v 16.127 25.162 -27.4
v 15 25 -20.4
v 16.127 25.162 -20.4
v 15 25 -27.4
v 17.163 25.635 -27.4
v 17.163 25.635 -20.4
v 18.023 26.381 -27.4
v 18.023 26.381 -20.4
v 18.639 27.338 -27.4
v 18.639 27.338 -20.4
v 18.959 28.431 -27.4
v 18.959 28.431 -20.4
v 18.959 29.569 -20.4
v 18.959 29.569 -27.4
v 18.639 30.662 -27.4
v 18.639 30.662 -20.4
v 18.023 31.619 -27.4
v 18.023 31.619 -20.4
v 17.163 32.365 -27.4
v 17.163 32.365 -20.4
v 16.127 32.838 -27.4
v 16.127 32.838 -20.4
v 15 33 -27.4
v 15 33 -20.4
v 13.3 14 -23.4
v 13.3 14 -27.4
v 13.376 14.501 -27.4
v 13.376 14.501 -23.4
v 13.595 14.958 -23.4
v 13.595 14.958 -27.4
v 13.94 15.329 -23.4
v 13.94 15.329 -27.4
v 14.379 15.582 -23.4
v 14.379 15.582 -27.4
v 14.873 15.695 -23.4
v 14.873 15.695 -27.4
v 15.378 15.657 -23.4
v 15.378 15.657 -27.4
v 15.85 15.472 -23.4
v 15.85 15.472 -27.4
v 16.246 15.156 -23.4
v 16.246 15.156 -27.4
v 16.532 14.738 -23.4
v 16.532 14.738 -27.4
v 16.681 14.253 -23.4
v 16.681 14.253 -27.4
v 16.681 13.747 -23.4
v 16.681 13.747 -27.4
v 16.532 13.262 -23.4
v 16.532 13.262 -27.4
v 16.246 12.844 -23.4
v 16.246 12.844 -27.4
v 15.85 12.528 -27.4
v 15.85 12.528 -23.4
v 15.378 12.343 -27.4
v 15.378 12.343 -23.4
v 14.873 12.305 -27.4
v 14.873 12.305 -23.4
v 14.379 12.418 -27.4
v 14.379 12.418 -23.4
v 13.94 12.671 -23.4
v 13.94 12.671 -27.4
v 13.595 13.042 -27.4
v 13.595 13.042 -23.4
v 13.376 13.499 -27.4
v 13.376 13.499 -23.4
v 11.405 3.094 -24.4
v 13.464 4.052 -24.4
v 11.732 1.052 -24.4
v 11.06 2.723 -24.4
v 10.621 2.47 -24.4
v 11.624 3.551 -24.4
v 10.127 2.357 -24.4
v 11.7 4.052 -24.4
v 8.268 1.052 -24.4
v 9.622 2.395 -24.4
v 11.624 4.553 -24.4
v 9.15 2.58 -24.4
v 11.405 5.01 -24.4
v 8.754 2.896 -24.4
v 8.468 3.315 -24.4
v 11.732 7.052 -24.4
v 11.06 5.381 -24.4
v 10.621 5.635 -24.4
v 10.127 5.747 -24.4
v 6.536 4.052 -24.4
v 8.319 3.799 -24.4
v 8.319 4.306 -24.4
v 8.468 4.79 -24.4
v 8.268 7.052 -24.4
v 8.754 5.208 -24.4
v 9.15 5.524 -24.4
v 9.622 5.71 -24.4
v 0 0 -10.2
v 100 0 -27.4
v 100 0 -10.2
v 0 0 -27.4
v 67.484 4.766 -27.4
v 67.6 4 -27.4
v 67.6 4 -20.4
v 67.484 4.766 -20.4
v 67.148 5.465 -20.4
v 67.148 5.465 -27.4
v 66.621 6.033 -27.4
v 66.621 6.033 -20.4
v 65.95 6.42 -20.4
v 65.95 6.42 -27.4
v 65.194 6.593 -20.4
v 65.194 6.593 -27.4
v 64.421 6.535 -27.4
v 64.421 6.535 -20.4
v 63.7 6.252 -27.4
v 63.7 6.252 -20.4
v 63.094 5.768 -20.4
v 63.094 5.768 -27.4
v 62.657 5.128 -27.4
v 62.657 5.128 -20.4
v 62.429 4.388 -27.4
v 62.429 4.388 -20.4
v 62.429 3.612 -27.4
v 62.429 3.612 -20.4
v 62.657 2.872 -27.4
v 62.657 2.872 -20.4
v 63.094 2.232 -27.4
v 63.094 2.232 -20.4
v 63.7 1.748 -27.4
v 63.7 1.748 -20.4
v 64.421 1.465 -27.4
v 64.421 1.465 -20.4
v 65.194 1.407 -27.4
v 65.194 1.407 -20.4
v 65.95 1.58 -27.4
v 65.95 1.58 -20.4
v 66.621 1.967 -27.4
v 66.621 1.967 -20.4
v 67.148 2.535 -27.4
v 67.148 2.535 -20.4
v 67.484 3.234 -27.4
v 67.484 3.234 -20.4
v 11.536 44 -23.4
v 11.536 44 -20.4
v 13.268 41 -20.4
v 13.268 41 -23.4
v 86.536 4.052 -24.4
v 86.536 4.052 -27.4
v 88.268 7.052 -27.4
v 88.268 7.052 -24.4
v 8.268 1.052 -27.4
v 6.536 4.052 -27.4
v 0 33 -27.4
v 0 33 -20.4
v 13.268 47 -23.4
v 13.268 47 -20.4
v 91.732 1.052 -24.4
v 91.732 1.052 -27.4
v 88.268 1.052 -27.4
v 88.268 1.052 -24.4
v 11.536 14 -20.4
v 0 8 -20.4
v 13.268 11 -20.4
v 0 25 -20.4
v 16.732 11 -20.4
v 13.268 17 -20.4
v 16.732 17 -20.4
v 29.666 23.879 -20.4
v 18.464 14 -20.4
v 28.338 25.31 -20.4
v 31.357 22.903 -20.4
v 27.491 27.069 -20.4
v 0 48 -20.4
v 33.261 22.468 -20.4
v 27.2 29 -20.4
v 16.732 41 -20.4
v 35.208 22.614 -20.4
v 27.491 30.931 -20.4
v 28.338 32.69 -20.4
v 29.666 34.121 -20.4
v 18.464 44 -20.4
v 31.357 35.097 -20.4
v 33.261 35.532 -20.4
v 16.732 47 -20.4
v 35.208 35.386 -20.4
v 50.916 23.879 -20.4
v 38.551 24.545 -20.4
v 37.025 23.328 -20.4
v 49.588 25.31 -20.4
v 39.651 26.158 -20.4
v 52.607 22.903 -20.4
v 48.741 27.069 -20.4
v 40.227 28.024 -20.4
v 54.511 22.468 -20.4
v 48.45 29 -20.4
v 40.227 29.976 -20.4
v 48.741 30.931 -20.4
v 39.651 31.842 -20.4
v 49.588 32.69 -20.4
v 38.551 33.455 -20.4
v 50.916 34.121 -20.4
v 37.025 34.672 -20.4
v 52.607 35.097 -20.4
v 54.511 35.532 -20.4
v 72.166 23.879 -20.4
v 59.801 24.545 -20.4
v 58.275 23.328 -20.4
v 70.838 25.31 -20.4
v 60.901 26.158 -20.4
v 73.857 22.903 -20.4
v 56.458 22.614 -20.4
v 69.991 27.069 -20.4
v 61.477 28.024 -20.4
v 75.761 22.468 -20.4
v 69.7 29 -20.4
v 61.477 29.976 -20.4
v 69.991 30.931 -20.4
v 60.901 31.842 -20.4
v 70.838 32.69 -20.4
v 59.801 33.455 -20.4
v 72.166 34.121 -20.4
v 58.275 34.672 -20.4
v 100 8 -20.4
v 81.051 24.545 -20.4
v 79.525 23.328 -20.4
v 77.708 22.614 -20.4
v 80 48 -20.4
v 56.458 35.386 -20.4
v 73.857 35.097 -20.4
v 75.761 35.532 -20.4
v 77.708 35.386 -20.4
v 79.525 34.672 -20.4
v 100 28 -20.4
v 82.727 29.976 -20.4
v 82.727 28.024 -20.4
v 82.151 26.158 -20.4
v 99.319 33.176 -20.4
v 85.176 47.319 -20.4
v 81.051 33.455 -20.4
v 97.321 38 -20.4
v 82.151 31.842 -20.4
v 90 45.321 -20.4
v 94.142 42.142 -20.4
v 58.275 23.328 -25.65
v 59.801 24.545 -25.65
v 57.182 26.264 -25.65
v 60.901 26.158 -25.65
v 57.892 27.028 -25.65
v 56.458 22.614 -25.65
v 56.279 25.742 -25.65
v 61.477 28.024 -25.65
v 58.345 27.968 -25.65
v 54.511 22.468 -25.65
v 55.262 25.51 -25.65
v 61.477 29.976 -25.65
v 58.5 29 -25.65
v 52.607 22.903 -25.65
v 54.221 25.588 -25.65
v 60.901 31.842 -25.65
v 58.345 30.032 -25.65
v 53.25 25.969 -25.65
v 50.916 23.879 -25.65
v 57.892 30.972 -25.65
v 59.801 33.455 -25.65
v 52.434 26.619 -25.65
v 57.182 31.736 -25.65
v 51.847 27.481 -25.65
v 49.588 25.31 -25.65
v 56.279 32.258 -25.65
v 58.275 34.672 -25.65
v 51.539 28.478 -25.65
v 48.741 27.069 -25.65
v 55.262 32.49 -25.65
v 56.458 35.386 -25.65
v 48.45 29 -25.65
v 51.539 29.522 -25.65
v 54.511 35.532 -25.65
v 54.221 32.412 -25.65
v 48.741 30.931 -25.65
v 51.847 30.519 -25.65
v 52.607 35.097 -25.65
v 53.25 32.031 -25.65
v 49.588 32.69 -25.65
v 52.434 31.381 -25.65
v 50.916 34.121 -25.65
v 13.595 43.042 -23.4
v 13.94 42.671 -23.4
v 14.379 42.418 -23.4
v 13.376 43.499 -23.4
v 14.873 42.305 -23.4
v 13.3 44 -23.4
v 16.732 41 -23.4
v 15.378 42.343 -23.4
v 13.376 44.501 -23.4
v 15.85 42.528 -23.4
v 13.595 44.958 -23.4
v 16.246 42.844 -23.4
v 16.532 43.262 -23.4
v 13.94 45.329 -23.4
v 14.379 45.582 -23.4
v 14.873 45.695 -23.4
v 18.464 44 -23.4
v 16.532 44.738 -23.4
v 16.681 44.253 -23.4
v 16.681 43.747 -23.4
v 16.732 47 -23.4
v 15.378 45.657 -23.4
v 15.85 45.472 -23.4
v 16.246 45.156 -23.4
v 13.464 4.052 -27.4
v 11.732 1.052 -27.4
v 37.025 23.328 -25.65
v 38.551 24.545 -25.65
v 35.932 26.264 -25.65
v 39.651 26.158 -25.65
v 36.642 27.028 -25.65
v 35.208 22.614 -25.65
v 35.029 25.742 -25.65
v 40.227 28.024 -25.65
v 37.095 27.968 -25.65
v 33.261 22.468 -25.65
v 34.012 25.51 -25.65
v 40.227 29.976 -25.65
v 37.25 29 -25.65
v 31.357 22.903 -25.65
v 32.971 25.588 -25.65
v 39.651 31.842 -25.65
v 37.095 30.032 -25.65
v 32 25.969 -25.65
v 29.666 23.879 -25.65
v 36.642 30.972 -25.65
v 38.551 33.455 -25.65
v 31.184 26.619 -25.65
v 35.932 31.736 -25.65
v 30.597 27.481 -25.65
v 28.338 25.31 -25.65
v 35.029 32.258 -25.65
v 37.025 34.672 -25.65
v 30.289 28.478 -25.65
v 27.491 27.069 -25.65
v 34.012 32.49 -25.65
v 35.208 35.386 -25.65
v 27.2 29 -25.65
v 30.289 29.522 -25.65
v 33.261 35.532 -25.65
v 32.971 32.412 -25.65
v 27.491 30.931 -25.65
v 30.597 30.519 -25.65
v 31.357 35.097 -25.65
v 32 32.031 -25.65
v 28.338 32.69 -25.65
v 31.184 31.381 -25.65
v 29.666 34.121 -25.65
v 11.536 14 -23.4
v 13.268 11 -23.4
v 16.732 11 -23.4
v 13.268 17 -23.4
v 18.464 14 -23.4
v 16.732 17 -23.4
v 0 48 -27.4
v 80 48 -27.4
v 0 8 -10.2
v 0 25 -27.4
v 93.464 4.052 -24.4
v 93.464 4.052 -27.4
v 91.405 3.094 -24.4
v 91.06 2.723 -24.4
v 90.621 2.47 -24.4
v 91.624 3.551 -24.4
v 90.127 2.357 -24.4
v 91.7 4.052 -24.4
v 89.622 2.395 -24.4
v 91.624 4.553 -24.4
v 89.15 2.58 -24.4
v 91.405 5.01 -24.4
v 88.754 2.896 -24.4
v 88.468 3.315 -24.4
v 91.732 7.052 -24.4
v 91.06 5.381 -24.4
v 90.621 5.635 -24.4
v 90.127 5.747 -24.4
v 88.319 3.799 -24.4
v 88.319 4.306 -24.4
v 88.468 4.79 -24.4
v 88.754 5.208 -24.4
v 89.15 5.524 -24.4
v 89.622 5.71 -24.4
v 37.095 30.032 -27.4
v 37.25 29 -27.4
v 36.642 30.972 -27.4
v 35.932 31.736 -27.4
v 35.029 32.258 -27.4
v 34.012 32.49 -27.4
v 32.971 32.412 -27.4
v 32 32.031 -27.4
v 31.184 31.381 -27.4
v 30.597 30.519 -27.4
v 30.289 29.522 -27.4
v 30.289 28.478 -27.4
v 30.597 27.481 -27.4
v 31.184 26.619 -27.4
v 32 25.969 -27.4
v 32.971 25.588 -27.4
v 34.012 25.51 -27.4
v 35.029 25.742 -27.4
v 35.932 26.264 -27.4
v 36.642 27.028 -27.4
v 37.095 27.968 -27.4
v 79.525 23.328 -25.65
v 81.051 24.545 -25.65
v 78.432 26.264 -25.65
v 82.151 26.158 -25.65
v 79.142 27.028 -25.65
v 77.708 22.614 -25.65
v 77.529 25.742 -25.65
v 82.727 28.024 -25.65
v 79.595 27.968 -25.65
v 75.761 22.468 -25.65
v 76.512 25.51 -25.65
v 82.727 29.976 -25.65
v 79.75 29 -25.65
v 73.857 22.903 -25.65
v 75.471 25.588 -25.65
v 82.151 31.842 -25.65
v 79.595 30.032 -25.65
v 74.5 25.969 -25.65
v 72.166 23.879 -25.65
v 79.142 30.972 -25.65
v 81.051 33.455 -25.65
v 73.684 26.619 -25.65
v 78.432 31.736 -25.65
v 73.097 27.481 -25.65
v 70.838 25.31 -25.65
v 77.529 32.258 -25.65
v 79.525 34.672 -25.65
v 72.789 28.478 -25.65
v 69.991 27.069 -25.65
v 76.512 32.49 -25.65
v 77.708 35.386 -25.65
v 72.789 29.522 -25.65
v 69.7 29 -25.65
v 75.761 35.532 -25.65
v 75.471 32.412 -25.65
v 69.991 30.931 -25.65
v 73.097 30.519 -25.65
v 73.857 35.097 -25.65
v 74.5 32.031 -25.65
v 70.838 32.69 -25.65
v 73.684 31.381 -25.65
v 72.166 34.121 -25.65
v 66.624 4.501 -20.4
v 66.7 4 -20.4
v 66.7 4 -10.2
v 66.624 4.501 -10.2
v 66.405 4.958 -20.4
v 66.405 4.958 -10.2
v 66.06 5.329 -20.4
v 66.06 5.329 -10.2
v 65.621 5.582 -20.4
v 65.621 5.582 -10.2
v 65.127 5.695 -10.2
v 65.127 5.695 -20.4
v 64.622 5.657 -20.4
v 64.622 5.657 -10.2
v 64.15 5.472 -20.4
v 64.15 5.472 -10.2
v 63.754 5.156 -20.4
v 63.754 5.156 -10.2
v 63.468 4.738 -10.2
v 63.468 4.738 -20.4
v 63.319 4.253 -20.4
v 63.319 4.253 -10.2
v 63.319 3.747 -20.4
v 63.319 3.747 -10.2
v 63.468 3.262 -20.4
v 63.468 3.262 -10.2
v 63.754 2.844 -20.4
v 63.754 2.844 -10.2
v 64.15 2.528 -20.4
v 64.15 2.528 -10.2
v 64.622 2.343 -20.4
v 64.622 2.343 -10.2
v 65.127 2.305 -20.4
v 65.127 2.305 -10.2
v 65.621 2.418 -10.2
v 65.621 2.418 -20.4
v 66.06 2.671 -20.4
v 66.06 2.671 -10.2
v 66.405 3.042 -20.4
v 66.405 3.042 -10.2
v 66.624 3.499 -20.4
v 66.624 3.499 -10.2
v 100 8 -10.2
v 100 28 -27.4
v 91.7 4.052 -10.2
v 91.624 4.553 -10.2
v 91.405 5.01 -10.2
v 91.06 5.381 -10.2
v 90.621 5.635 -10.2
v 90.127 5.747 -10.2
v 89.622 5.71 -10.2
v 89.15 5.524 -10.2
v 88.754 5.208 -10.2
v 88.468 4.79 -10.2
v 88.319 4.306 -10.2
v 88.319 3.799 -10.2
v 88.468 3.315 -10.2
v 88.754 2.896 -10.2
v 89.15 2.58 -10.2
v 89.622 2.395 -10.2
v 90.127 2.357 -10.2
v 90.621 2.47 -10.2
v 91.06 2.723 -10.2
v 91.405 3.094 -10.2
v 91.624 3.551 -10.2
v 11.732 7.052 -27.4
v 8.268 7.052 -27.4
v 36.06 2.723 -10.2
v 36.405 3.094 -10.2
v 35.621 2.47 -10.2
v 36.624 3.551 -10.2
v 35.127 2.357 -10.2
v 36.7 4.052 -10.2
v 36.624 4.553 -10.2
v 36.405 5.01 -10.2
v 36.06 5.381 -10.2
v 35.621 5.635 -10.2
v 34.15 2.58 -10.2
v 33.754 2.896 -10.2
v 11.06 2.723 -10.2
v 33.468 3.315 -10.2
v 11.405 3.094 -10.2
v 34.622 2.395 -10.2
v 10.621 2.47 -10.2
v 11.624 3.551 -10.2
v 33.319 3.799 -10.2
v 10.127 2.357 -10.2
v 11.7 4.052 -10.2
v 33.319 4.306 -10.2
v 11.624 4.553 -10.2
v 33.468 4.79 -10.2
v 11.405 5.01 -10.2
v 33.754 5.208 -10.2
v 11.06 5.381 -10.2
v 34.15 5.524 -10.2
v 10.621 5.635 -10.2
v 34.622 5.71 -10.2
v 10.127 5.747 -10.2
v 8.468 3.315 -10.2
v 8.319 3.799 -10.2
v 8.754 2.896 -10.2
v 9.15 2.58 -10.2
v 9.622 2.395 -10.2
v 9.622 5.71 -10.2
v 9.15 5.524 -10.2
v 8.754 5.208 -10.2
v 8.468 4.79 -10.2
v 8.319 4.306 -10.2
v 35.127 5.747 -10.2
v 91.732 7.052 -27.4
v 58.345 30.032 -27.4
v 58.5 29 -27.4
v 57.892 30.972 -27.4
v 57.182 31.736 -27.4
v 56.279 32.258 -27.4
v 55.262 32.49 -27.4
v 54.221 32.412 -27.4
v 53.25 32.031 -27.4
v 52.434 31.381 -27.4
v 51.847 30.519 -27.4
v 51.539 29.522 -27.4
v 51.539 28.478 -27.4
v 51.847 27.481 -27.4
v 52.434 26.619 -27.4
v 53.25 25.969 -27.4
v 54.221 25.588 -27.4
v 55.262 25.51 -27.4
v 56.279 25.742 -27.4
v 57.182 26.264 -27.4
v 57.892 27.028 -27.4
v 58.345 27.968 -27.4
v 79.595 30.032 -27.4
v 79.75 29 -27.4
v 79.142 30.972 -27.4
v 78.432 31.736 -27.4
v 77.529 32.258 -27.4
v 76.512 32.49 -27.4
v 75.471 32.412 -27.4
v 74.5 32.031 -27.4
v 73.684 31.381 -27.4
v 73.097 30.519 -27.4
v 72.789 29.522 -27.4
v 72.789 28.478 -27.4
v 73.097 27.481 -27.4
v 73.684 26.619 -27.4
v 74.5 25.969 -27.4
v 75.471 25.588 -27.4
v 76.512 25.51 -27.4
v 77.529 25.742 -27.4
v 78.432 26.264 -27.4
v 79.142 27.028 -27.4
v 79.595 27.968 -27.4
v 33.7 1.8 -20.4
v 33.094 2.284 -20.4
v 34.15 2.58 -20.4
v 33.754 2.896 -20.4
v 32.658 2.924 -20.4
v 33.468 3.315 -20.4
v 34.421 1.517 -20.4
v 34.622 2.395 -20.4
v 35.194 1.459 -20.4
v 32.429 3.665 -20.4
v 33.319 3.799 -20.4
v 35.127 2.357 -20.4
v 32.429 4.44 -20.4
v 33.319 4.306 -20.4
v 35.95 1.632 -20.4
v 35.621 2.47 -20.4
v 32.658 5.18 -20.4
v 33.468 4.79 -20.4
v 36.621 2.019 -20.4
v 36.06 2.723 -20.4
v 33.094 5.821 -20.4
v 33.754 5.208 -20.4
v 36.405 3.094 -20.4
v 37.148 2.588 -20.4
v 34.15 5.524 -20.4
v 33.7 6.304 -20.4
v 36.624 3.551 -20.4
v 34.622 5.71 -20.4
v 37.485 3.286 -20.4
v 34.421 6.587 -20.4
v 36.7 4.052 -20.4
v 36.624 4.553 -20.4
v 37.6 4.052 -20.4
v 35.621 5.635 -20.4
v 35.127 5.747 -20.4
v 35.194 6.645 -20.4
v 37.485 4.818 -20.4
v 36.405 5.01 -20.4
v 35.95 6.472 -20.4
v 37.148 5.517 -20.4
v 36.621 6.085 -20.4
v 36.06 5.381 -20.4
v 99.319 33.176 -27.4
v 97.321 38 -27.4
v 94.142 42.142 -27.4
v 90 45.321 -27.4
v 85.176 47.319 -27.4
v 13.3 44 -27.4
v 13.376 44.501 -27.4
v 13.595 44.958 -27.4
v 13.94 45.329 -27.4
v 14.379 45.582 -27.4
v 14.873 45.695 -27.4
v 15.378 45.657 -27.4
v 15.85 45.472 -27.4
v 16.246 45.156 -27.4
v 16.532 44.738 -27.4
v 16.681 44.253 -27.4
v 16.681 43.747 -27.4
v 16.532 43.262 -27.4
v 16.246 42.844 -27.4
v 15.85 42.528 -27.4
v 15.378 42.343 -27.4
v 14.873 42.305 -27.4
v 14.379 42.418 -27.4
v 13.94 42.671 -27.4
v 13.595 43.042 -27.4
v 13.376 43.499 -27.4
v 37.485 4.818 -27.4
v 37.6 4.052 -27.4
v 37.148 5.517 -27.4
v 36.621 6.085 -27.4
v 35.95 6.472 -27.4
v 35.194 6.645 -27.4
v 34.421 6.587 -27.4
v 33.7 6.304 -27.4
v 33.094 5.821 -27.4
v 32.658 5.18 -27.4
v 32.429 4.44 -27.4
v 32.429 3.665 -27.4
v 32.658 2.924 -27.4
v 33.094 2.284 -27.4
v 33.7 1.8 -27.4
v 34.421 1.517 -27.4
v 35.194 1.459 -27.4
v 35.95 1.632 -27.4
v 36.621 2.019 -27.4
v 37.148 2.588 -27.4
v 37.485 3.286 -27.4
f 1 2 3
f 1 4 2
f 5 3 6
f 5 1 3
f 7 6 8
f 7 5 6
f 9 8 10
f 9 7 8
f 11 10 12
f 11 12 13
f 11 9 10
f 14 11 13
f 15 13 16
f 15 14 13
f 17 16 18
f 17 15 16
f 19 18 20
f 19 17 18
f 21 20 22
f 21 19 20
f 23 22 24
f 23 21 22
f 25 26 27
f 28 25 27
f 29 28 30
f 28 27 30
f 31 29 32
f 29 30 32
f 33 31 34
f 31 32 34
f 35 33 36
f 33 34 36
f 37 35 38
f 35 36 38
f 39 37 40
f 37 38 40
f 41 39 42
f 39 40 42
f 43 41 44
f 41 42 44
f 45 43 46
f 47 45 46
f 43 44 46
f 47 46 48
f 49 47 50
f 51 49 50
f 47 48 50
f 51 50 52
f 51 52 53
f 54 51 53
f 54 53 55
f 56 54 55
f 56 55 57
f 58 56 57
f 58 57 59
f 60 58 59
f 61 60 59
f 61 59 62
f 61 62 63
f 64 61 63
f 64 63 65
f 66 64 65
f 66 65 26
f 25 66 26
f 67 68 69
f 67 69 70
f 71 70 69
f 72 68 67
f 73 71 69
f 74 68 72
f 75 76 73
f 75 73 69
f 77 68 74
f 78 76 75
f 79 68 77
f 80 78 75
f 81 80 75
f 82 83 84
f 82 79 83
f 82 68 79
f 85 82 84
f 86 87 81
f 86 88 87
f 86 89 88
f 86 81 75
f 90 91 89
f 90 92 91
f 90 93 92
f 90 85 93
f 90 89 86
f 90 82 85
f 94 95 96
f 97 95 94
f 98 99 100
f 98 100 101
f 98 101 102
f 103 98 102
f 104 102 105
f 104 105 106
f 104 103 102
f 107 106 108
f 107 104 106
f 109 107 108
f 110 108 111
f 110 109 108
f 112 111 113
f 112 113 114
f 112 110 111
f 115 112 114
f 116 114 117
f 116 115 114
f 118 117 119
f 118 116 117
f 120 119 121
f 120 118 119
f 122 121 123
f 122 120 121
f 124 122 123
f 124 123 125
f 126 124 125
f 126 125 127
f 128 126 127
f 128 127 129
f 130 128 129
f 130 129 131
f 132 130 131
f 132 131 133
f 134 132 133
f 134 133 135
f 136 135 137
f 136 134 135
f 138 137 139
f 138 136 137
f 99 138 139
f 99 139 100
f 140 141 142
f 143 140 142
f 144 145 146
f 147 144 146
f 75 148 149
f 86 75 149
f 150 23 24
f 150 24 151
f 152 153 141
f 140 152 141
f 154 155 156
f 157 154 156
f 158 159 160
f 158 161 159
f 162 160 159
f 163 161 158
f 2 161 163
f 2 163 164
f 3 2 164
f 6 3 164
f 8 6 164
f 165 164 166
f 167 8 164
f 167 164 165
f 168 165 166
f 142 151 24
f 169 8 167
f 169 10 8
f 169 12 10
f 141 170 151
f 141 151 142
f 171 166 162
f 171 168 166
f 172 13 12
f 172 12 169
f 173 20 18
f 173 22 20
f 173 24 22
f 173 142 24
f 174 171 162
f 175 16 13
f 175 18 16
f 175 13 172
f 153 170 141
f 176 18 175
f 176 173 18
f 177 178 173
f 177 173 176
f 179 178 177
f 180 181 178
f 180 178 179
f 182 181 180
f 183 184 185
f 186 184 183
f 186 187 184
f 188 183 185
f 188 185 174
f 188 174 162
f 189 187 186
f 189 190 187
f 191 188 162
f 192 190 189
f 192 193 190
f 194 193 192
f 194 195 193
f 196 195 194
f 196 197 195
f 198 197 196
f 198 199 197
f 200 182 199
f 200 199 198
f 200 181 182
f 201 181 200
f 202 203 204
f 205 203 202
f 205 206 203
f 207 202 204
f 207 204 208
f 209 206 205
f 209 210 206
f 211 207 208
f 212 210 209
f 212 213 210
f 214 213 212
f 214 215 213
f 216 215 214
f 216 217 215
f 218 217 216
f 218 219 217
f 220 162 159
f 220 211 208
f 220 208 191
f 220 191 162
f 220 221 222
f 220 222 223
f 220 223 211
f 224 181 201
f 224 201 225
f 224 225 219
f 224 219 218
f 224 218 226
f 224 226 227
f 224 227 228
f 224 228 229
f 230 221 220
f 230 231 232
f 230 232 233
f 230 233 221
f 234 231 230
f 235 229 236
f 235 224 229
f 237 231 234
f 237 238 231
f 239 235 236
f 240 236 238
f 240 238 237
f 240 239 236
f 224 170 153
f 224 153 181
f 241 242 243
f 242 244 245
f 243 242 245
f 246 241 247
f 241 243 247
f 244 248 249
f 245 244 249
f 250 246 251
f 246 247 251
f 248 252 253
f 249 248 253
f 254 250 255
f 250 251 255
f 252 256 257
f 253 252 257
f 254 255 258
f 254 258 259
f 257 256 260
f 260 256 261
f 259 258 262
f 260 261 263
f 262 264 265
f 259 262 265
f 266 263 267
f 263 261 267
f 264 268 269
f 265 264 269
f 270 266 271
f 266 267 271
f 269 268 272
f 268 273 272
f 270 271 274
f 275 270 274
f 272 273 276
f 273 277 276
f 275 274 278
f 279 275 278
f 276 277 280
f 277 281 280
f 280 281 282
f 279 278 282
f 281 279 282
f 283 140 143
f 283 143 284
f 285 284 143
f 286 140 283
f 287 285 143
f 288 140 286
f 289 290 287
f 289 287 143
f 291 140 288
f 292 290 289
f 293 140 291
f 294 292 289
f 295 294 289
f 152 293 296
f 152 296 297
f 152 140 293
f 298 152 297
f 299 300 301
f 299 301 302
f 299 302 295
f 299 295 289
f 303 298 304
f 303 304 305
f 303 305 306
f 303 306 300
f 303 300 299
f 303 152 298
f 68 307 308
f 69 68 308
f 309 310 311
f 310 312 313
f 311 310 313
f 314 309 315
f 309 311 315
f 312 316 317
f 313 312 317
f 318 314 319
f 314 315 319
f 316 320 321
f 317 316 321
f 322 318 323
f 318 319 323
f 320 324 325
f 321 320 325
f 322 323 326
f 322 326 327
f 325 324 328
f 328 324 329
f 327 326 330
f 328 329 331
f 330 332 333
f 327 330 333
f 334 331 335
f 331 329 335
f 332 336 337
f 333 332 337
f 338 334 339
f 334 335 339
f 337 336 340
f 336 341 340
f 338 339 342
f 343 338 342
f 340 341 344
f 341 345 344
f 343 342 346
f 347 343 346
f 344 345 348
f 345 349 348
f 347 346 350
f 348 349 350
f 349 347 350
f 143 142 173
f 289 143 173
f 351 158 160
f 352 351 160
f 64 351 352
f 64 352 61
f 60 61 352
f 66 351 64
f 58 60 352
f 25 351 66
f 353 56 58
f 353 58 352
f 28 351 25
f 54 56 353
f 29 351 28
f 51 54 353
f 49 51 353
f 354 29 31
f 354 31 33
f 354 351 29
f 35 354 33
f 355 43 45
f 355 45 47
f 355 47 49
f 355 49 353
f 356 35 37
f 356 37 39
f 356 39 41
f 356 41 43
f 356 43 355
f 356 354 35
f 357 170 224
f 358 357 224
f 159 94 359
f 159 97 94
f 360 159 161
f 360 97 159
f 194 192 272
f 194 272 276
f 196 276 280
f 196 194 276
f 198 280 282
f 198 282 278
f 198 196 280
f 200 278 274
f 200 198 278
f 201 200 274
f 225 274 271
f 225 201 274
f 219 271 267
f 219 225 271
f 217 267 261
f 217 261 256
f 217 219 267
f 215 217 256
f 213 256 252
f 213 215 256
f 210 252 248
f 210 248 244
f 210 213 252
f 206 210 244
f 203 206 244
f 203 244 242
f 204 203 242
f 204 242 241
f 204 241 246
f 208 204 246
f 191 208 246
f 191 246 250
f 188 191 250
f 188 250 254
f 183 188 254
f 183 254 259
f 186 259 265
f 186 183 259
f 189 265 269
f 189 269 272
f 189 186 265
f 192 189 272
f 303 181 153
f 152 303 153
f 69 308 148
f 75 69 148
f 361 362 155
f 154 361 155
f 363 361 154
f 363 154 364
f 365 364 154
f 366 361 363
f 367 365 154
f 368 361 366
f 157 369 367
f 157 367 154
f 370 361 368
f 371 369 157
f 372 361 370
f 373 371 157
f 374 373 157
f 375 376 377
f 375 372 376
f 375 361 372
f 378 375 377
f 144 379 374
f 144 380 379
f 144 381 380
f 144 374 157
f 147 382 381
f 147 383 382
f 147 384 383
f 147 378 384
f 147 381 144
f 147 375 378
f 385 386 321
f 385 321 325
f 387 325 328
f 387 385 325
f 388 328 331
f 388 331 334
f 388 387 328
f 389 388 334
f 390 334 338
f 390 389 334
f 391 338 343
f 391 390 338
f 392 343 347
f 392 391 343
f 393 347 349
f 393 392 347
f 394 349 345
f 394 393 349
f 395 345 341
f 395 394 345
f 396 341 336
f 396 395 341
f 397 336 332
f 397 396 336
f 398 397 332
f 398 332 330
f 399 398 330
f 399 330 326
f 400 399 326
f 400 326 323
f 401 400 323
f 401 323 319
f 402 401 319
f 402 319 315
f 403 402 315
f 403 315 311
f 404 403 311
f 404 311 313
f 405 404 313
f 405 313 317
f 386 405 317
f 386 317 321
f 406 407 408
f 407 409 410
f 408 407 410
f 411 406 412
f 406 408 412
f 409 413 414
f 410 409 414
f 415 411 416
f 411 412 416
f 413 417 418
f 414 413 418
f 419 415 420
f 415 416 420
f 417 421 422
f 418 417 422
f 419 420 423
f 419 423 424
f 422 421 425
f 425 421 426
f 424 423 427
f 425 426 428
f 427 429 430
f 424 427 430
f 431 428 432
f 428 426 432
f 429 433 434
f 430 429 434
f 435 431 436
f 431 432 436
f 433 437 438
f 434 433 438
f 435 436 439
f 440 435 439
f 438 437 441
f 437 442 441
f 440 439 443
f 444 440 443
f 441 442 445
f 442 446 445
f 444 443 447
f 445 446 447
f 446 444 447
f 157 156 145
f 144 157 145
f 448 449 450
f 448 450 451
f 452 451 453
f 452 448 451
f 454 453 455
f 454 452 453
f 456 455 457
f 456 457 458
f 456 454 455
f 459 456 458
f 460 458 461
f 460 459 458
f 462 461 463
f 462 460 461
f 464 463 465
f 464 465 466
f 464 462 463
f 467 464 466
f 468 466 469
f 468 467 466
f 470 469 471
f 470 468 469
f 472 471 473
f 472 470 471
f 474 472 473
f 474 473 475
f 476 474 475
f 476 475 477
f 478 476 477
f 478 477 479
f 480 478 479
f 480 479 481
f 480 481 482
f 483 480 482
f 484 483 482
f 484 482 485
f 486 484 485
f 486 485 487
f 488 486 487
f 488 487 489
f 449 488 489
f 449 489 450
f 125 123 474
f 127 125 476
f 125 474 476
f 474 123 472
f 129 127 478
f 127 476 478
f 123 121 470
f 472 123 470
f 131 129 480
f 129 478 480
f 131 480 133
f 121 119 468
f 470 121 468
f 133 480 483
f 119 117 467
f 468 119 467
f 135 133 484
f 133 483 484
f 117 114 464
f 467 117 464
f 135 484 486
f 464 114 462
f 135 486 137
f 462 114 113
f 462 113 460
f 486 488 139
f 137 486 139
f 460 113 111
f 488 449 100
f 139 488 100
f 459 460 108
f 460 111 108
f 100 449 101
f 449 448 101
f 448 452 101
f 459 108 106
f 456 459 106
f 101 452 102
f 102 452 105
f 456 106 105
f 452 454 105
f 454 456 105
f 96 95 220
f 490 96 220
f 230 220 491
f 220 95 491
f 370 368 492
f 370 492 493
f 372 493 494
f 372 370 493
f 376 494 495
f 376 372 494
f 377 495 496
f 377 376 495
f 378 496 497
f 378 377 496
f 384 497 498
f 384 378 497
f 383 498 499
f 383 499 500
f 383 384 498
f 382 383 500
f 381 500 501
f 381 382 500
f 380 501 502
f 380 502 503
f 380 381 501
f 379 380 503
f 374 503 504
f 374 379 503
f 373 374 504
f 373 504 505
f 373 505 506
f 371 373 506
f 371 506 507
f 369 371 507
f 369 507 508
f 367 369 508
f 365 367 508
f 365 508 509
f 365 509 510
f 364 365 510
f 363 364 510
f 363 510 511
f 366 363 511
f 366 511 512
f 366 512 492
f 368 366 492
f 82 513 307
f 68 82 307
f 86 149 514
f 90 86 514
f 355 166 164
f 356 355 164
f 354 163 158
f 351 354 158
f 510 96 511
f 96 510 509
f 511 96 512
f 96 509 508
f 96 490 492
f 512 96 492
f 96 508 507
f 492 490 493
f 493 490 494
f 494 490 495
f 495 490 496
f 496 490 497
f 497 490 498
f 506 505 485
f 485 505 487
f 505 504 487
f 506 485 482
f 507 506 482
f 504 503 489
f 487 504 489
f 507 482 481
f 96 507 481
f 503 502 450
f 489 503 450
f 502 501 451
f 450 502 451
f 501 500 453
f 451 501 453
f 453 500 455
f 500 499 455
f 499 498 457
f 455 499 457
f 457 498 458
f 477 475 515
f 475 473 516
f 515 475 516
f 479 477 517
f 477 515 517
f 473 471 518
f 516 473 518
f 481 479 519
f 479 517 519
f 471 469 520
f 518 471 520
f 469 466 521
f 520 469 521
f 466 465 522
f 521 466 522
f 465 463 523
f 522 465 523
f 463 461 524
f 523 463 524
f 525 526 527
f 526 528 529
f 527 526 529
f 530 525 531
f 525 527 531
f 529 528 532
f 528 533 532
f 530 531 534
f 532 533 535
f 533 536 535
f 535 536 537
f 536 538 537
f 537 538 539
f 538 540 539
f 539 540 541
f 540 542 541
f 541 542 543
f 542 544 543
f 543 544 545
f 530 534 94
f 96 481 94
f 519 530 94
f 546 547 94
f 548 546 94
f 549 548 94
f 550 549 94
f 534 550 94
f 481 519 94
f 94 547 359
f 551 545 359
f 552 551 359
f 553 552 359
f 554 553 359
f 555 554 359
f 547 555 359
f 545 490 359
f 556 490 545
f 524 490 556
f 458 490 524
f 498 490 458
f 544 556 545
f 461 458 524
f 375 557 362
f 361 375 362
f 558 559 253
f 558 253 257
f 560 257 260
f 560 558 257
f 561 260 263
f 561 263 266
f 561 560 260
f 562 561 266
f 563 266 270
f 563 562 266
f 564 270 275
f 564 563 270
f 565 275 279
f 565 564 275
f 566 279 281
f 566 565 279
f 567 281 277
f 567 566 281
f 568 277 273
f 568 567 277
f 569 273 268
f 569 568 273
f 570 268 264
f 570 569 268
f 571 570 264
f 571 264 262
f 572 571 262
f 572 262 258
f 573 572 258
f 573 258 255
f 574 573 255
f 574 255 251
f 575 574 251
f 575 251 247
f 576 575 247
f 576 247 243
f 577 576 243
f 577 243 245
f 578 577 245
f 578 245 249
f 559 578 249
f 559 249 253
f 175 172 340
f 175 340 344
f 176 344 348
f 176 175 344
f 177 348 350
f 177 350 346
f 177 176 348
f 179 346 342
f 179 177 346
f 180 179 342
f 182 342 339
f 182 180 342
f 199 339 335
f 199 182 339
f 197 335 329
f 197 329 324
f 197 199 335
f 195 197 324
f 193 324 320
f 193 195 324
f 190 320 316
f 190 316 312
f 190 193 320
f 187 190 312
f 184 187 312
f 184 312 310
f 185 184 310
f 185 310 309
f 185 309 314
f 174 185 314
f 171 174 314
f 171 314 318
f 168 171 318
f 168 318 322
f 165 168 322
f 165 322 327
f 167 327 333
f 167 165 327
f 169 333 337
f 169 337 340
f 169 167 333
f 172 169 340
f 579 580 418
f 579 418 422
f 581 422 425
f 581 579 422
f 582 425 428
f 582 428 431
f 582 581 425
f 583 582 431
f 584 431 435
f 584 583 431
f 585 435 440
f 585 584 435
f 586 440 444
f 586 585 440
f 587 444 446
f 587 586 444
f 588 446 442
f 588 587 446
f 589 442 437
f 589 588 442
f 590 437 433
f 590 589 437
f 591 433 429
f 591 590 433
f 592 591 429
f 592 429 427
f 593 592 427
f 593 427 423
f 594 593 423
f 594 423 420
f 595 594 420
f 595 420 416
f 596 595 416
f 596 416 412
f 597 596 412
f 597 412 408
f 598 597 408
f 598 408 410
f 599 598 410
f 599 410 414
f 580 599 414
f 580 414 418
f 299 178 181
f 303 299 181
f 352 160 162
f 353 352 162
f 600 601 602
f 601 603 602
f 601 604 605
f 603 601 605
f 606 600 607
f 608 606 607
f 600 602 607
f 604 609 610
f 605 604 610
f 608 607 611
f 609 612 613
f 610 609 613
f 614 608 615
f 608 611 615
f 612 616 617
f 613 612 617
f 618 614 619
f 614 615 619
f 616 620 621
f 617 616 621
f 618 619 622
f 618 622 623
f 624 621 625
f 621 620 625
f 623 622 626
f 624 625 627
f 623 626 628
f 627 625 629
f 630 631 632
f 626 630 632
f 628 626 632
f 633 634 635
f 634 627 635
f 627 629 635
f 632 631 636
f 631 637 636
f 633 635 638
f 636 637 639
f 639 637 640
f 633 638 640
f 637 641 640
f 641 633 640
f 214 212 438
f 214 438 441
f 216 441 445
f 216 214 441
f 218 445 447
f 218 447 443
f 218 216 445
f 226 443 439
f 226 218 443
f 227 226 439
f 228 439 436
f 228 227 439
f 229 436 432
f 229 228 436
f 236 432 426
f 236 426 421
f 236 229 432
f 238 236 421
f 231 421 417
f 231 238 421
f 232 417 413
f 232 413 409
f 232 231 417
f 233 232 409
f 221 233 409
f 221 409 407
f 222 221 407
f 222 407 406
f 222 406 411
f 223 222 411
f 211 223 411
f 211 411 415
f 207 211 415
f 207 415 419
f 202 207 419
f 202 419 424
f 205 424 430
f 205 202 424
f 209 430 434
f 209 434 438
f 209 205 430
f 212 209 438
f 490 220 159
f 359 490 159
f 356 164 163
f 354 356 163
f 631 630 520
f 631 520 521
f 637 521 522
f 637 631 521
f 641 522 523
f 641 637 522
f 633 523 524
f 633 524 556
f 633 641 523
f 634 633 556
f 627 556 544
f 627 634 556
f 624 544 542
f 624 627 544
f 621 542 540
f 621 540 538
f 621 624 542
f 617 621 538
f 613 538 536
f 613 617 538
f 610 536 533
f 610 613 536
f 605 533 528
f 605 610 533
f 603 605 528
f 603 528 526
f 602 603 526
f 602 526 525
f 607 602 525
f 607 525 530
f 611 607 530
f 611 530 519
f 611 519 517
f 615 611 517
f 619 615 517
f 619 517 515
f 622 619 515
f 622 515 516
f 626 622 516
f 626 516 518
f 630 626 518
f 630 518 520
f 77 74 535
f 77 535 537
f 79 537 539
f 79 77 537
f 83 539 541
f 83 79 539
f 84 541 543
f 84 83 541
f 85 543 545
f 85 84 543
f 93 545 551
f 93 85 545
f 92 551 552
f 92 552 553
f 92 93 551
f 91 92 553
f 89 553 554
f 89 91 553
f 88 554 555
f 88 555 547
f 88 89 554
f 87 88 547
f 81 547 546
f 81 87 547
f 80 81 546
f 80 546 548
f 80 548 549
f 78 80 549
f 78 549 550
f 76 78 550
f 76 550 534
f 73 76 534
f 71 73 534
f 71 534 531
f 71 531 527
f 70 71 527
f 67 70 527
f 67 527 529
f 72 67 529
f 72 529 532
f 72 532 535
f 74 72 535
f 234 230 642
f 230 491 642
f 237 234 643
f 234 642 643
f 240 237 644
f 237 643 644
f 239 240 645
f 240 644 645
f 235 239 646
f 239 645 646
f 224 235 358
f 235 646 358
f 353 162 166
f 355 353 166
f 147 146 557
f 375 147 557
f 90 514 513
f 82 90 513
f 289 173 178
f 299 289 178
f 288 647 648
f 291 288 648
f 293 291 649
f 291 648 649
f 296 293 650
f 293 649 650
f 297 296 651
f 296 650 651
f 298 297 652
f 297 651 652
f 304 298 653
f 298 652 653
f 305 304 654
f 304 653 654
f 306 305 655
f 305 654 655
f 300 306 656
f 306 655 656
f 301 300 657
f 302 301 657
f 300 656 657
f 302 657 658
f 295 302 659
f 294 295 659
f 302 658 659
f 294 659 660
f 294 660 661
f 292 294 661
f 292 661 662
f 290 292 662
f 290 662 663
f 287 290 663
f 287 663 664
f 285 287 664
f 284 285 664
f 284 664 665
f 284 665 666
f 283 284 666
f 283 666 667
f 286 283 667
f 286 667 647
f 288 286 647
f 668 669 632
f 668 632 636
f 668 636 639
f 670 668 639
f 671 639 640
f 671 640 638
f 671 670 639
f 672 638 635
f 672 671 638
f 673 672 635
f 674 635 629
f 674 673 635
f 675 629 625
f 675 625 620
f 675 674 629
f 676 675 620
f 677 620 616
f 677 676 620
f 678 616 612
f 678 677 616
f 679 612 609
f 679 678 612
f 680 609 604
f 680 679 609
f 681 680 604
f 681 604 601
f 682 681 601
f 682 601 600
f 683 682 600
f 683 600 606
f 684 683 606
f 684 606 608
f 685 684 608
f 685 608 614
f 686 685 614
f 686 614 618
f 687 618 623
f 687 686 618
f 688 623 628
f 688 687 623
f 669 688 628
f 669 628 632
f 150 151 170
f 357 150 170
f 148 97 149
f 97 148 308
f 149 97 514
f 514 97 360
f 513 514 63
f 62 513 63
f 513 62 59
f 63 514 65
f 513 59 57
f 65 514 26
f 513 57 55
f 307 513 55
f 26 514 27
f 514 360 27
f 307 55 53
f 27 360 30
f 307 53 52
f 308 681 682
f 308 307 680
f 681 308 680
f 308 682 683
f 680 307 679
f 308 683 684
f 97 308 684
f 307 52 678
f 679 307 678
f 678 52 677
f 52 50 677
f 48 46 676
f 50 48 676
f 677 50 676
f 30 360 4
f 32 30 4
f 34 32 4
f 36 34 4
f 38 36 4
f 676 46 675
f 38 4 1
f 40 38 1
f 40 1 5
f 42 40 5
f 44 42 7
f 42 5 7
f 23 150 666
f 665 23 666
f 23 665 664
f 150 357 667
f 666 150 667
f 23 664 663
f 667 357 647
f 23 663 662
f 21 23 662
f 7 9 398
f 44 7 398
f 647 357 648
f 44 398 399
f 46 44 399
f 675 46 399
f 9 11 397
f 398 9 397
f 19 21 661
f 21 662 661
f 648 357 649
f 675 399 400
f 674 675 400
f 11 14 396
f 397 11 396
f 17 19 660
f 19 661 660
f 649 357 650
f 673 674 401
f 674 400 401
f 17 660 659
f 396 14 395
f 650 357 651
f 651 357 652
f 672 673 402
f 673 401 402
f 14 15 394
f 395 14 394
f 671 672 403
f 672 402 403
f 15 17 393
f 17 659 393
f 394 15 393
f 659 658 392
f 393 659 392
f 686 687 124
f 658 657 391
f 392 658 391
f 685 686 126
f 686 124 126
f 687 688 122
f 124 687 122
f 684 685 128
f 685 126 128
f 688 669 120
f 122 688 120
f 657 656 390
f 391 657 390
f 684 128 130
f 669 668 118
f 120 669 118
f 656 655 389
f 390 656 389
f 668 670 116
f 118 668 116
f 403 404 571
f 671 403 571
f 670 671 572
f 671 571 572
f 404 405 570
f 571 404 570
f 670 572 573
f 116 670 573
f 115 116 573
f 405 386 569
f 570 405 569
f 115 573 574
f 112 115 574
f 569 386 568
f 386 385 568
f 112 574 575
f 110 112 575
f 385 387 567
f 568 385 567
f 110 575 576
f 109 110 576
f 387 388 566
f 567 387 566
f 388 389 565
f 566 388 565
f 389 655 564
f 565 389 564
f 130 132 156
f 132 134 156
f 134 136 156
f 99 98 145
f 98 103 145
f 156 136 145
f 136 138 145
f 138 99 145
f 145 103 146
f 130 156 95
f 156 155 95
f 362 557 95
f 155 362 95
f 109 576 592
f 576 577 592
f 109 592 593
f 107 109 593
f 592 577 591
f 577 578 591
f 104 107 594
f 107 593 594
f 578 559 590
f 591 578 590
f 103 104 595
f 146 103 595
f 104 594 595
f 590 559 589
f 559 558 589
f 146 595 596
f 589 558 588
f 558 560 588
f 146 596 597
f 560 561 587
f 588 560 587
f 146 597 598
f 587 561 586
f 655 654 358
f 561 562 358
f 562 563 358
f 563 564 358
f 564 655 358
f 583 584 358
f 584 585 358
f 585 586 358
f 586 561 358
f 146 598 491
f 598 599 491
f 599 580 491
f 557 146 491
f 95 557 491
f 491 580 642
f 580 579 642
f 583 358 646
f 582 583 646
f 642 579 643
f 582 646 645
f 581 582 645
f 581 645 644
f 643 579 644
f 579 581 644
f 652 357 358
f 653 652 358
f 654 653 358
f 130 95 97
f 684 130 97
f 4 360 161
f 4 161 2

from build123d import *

# Parameters (mm, degrees)
SKETCH1_W           = 100
SKETCH1_H           = 48
BOSS_EXTRUDE1_DEPTH = 7
CUT_EXTRUDE1_REACH  = 113.144
SKETCH2_R           = 4
SKETCH2_R_2         = 3.5
SKETCH3_W           = 100
SKETCH3_H           = 8
BOSS_EXTRUDE2_DEPTH = 10.2
SKETCH4_R           = 6.55
CUT_EXTRUDE2_DEPTH  = 5.25
SKETCH5_R           = 2.6
CUT_EXTRUDE3_DEPTH  = 7
SKETCH7_R           = 1.7
CUT_EXTRUDE4_DEPTH  = 112.391382072
CUT_EXTRUDE5_REACH  = 114.249
SKETCH8_R           = 1.7
CUT_EXTRUDE6_DEPTH  = 3
CUT_EXTRUDE7_REACH  = 114.249
SKETCH10_R          = 1.7
CUT_EXTRUDE8_DEPTH  = 3
FILLET1_R           = 20


with BuildPart() as part:
    # Sketch1 → Boss-Extrude1 (new body)
    with BuildSketch(Plane.XY):
        with Locations((50, 24)):
            Rectangle(SKETCH1_W, SKETCH1_H)
    extrude(amount=BOSS_EXTRUDE1_DEPTH)

    # Sketch2 → Cut-Extrude1 (cut, up to next)
    with BuildSketch(Plane.XY.offset(7), mode=Mode.PRIVATE) as cut_extrude1_sk1:
        with BuildLine():
            ThreePointArc((15, 25), (11, 29), (15, 33))
            Line((15, 33), (0, 33))
            Line((0, 33), (0, 25))
            Line((0, 25), (15, 25))
        make_face()
    cut_extrude1_tool1 = extrude(cut_extrude1_sk1.sketch, amount=-CUT_EXTRUDE1_REACH, mode=Mode.PRIVATE) & part.part
    # Sketch2 → Cut-Extrude1 (cut, up to next)
    with BuildSketch(Plane.XY.offset(7), mode=Mode.PRIVATE) as cut_extrude1_sk2:
        with Locations((15, 29)):
            Circle(SKETCH2_R)
    cut_extrude1_tool2 = extrude(cut_extrude1_sk2.sketch, amount=-CUT_EXTRUDE1_REACH, mode=Mode.PRIVATE) & part.part
    # Sketch2 → Cut-Extrude1 (cut, up to next)
    with BuildSketch(Plane.XY.offset(7), mode=Mode.PRIVATE) as cut_extrude1_sk3:
        with Locations((33.75, 29)):
            Circle(SKETCH2_R_2)
    cut_extrude1_tool3 = extrude(cut_extrude1_sk3.sketch, amount=-CUT_EXTRUDE1_REACH, mode=Mode.PRIVATE) & part.part
    # Sketch2 → Cut-Extrude1 (cut, up to next)
    with BuildSketch(Plane.XY.offset(7), mode=Mode.PRIVATE) as cut_extrude1_sk4:
        with Locations((55, 29)):
            Circle(SKETCH2_R_2)
    cut_extrude1_tool4 = extrude(cut_extrude1_sk4.sketch, amount=-CUT_EXTRUDE1_REACH, mode=Mode.PRIVATE) & part.part
    # Sketch2 → Cut-Extrude1 (cut, up to next)
    with BuildSketch(Plane.XY.offset(7), mode=Mode.PRIVATE) as cut_extrude1_sk5:
        with Locations((76.25, 29)):
            Circle(SKETCH2_R_2)
    cut_extrude1_tool5 = extrude(cut_extrude1_sk5.sketch, amount=-CUT_EXTRUDE1_REACH, mode=Mode.PRIVATE) & part.part
    add(cut_extrude1_tool1.solids().sort_by_distance((5.962811, 29, 7))[0], mode=Mode.SUBTRACT)
    add(cut_extrude1_tool2.solids().sort_by_distance((15, 29, 7))[0], mode=Mode.SUBTRACT)
    add(cut_extrude1_tool3.solids().sort_by_distance((33.75, 29, 7))[0], mode=Mode.SUBTRACT)
    add(cut_extrude1_tool4.solids().sort_by_distance((55, 29, 7))[0], mode=Mode.SUBTRACT)
    add(cut_extrude1_tool5.solids().sort_by_distance((76.25, 29, 7))[0], mode=Mode.SUBTRACT)

    # Sketch3 → Boss-Extrude2 (add)
    with BuildSketch(Plane(origin=(0, 0, 0), x_dir=(-1, 0, 0), z_dir=(0, 0, -1))):
        with Locations((-50, 4)):
            Rectangle(SKETCH3_W, SKETCH3_H)
    extrude(amount=BOSS_EXTRUDE2_DEPTH)

    # Sketch4 → Cut-Extrude2 (cut)
    with BuildSketch(Plane(origin=(0, 0, 0), x_dir=(-1, 0, 0), z_dir=(0, 0, -1))):
        with Locations((-76.25, 29)):
            Circle(SKETCH4_R)
        with Locations((-55, 29)):
            Circle(SKETCH4_R)
        with Locations((-33.75, 29)):
            Circle(SKETCH4_R)
    extrude(amount=-CUT_EXTRUDE2_DEPTH, mode=Mode.SUBTRACT)

    # Sketch5 → Cut-Extrude3 (cut)
    with BuildSketch(Plane.XY.offset(7)):
        with Locations((35.000022648, 4.052132501)):
            Circle(SKETCH5_R)
        with Locations((64.999977352, 4)):
            Circle(SKETCH5_R)
    extrude(amount=-CUT_EXTRUDE3_DEPTH, mode=Mode.SUBTRACT)

    # Sketch7 → Cut-Extrude4 (cut, through all)
    with BuildSketch(Plane.XY):
        with Locations((35.000022648, 4.052132501)):
            Circle(SKETCH7_R)
        with Locations((64.999977352, 4)):
            Circle(SKETCH7_R)
    extrude(amount=-CUT_EXTRUDE4_DEPTH, mode=Mode.SUBTRACT)

    # Sketch8 → Cut-Extrude5 (cut, up to next)
    with BuildSketch(Plane.XY.offset(7), mode=Mode.PRIVATE) as cut_extrude5_sk1:
        with Locations((10, 4.052132501)):
            Circle(SKETCH8_R)
    cut_extrude5_tool1 = extrude(cut_extrude5_sk1.sketch, amount=-CUT_EXTRUDE5_REACH, mode=Mode.PRIVATE) & part.part
    # Sketch8 → Cut-Extrude5 (cut, up to next)
    with BuildSketch(Plane.XY.offset(7), mode=Mode.PRIVATE) as cut_extrude5_sk2:
        with Locations((90, 4.052132501)):
            Circle(SKETCH8_R)
    cut_extrude5_tool2 = extrude(cut_extrude5_sk2.sketch, amount=-CUT_EXTRUDE5_REACH, mode=Mode.PRIVATE) & part.part
    add(cut_extrude5_tool1.solids().sort_by_distance((10, 4.052133, 7))[0], mode=Mode.SUBTRACT)
    add(cut_extrude5_tool2.solids().sort_by_distance((90, 4.052133, 7))[0], mode=Mode.SUBTRACT)


with BuildPart() as body_2:
    # Mirror1: mirrored copy
    add(part.part.mirror(Plane.XY.offset(-10.2)))

    # Sketch9 → Cut-Extrude6 (cut)
    with BuildSketch(Plane(origin=(0, 0, -27.4), x_dir=(-1, 0, 0), z_dir=(0, 0, -1))):
        Polygon((-88.267949192, 1.052132501), (-86.535898385, 4.052132501), (-88.267949192, 7.052132501), (-91.732050808, 7.052132501), (-93.464101615, 4.052132501), (-91.732050808, 1.052132501), align=None)
        Polygon((-13.464101615, 4.052132501), (-11.732050808, 1.052132501), (-8.267949192, 1.052132501), (-6.535898385, 4.052132501), (-8.267949192, 7.052132501), (-11.732050808, 7.052132501), align=None)
    extrude(amount=-CUT_EXTRUDE6_DEPTH, mode=Mode.SUBTRACT)

    # Sketch10 → Cut-Extrude7 (cut, up to next)
    with BuildSketch(Plane(origin=(0, 0, -27.4), x_dir=(-1, 0, 0), z_dir=(0, 0, -1)), mode=Mode.PRIVATE) as cut_extrude7_sk1:
        with Locations((-15, 44)):
            Circle(SKETCH10_R)
    cut_extrude7_tool1 = extrude(cut_extrude7_sk1.sketch, amount=-CUT_EXTRUDE7_REACH, mode=Mode.PRIVATE) & body_2.part
    # Sketch10 → Cut-Extrude7 (cut, up to next)
    with BuildSketch(Plane(origin=(0, 0, -27.4), x_dir=(-1, 0, 0), z_dir=(0, 0, -1)), mode=Mode.PRIVATE) as cut_extrude7_sk2:
        with Locations((-15, 14)):
            Circle(SKETCH10_R)
    cut_extrude7_tool2 = extrude(cut_extrude7_sk2.sketch, amount=-CUT_EXTRUDE7_REACH, mode=Mode.PRIVATE) & body_2.part
    add(cut_extrude7_tool1.solids().sort_by_distance((15, 44, -27.4))[0], mode=Mode.SUBTRACT)
    add(cut_extrude7_tool2.solids().sort_by_distance((15, 14, -27.4))[0], mode=Mode.SUBTRACT)

    # Sketch11 → Cut-Extrude8 (cut)
    with BuildSketch(Plane.XY.offset(-20.4)):
        Polygon((18.464101615, 44), (16.732050808, 47), (13.267949192, 47), (11.535898385, 44), (13.267949192, 41), (16.732050808, 41), align=None)
        Polygon((18.464101615, 14), (16.732050808, 17), (13.267949192, 17), (11.535898385, 14), (13.267949192, 11), (16.732050808, 11), align=None)
    extrude(amount=-CUT_EXTRUDE8_DEPTH, mode=Mode.SUBTRACT)

    # Fillet1
    fillet1_edges = [body_2.edges().sort_by_distance(p)[0] for p in [
        (100, 48, -23.9),
    ]]
    fillet(fillet1_edges, radius=FILLET1_R)


solid = body_2.part
